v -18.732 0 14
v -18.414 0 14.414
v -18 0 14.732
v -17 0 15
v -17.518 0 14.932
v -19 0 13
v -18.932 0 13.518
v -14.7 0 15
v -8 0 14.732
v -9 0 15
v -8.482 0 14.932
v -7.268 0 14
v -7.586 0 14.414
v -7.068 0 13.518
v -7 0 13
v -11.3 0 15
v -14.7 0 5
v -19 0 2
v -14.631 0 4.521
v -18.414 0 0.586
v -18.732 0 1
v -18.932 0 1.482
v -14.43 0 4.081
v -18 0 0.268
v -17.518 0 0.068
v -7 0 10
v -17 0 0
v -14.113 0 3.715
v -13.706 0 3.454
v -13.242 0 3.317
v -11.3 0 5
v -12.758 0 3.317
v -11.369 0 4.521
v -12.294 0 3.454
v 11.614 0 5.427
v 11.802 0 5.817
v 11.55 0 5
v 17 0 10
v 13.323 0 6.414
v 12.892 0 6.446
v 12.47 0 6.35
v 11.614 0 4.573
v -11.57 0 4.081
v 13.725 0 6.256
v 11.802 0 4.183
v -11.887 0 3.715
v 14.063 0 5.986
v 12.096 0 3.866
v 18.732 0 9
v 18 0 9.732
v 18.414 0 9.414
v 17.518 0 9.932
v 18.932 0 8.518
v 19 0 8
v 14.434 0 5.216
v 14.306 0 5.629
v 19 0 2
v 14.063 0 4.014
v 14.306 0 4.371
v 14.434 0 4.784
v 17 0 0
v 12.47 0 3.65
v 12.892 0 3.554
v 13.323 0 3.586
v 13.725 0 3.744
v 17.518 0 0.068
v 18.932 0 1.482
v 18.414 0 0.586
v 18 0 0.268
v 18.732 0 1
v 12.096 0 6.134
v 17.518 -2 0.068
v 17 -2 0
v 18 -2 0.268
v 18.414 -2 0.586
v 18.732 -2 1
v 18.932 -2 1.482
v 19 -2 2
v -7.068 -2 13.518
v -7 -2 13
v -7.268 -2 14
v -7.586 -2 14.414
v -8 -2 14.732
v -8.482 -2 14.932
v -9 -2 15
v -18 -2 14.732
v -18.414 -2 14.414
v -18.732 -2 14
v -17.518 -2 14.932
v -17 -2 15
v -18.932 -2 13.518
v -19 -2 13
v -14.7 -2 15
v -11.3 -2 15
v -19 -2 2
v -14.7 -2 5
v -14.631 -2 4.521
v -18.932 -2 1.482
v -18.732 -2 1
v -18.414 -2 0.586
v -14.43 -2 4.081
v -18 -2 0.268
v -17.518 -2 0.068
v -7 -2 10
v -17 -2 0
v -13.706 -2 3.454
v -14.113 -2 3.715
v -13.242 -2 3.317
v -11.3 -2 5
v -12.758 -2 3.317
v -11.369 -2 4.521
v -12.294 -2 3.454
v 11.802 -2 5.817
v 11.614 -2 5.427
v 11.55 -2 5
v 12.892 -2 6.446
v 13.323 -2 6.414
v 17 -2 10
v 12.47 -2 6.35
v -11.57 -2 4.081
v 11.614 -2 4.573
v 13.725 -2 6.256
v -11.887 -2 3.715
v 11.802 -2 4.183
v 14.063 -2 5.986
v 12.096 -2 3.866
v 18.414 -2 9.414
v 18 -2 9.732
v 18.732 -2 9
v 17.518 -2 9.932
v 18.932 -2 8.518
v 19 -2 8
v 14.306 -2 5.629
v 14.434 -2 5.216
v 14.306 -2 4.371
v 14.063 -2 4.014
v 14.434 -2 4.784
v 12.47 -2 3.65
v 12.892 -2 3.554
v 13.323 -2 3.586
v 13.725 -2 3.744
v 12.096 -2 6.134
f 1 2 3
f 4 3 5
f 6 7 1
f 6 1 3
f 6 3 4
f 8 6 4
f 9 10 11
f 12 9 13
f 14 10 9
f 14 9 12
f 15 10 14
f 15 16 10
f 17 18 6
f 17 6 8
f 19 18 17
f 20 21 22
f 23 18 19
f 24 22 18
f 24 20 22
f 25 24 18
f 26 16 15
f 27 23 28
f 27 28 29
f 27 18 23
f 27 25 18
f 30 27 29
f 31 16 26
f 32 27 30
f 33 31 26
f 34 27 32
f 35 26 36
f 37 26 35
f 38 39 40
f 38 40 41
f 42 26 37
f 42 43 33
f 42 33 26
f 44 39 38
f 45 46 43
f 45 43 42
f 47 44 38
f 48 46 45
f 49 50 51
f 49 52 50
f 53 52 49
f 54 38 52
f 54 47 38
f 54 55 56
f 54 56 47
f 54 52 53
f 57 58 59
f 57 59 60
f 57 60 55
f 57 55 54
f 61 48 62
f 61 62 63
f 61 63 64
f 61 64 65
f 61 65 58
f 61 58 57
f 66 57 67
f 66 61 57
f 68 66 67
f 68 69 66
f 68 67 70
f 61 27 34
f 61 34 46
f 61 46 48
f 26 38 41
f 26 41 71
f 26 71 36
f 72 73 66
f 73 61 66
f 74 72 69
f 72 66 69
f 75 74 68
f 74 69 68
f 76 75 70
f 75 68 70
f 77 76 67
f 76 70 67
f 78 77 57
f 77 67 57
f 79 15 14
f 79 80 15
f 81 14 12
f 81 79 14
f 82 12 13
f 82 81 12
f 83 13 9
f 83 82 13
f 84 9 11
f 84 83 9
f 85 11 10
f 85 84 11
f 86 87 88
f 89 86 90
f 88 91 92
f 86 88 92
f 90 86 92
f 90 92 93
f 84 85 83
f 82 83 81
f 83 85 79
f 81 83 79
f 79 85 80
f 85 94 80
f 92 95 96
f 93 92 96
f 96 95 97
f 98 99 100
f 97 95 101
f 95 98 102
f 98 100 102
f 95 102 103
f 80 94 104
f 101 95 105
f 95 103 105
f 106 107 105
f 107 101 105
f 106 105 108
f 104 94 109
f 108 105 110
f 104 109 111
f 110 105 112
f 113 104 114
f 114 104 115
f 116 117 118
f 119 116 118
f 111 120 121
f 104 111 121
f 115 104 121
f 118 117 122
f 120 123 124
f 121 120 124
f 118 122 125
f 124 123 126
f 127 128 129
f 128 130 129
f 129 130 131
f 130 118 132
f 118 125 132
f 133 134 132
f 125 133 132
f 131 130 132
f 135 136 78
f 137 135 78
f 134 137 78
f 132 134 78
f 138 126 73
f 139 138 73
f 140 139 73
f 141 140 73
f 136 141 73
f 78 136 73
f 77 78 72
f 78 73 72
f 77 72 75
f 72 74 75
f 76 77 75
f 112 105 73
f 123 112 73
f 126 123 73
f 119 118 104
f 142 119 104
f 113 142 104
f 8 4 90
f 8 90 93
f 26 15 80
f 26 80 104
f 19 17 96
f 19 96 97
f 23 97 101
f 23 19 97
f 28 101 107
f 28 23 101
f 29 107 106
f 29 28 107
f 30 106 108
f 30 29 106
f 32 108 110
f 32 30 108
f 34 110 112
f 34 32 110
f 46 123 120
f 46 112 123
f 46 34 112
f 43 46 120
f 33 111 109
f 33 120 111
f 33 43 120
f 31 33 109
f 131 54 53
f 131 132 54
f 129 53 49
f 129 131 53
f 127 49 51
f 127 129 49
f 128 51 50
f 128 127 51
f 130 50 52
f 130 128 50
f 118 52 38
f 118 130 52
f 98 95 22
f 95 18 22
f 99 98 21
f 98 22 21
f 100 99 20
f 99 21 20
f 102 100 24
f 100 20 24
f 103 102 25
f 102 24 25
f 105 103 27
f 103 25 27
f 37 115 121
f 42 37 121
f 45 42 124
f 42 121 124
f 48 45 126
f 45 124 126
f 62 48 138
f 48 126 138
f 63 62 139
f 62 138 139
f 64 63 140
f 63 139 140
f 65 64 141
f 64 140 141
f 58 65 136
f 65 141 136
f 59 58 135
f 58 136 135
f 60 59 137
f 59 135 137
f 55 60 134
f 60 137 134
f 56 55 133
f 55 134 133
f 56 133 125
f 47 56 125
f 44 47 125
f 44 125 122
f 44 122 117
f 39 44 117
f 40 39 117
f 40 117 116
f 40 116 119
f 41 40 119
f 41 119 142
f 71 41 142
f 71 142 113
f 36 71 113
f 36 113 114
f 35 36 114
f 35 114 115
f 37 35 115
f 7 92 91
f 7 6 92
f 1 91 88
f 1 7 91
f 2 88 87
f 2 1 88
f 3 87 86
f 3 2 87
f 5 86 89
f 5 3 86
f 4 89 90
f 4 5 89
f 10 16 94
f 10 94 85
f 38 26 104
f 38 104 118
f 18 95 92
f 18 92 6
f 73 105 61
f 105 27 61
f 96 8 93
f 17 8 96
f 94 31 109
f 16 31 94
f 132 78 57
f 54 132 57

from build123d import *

# Parameters (mm, degrees)
SKETCH_1_W             = 38
SKETCH_1_H             = 2
SM_BASE_FLANGE_1_DEPTH = 15
CUT_EXTRUDE_1_REACH    = 26.29
SKETCH_6_W             = 26
SKETCH_6_H             = 5
HOLE_WIZARD_M2_5_1_D   = 2.9
CUT_EXTRUDE_2_REACH    = 26.29
FILLET_1_R             = 2


# Sheet-metal steps are written as plain solids
with BuildPart() as part:
    # Sketch 1 → ﾍﾞｰｽ-ﾌﾗﾝｼﾞ1 (new body)
    with BuildSketch(Plane.XY):
        with Locations((0, -1)):
            Rectangle(SKETCH_1_W, SKETCH_1_H)
    extrude(amount=SM_BASE_FLANGE_1_DEPTH)

    # ｽｹｯﾁ6 → ｶｯﾄ - 押し出し1 (cut, up to next)
    with BuildSketch(Plane(origin=(0, 0, 0), x_dir=(1, 0, 0), z_dir=(0, 1, 0)), mode=Mode.PRIVATE) as cut_extrude_1_sk1:
        with Locations((6, -12.5)):
            Rectangle(SKETCH_6_W, SKETCH_6_H)
    cut_extrude_1_tool1 = extrude(cut_extrude_1_sk1.sketch, amount=-CUT_EXTRUDE_1_REACH, mode=Mode.PRIVATE) & part.part
    add(cut_extrude_1_tool1.solids().sort_by_distance((6, 0, 12.5))[0], mode=Mode.SUBTRACT)

    # M2.5 すきま穴1 (through all)
    with Locations(Plane(origin=(0, 0, 0), x_dir=(1, 0, 0), z_dir=(0, 1, 0))):
        with Locations((13, -5)):
            Hole(HOLE_WIZARD_M2_5_1_D / 2)

    # ｽｹｯﾁ9 → ｶｯﾄ - 押し出し2 (cut, up to next)
    with BuildSketch(Plane(origin=(0, 0, 0), x_dir=(1, 0, 0), z_dir=(0, 1, 0)), mode=Mode.PRIVATE) as cut_extrude_2_sk1:
        with BuildLine():
            Line((-11.3, -5), (-11.3, -15))
            ThreePointArc((-11.3, -15), (-13, -16.7), (-14.7, -15))
            Line((-14.7, -15), (-14.7, -5))
            ThreePointArc((-14.7, -5), (-13, -3.3), (-11.3, -5))
        make_face()
    cut_extrude_2_tool1 = extrude(cut_extrude_2_sk1.sketch, amount=-CUT_EXTRUDE_2_REACH, mode=Mode.PRIVATE) & part.part
    add(cut_extrude_2_tool1.solids().sort_by_distance((-13, 0, 10))[0], mode=Mode.SUBTRACT)

    # ﾌｨﾚｯﾄ1
    fillet_1_edges = [part.edges().sort_by_distance(p)[0] for p in [
        (-19, -1, 15),
        (19, -1, 10),
        (-7, -1, 15),
        (-19, -1, 0),
        (19, -1, 0),
    ]]
    fillet(fillet_1_edges, radius=FILLET_1_R)


solid = part.part
